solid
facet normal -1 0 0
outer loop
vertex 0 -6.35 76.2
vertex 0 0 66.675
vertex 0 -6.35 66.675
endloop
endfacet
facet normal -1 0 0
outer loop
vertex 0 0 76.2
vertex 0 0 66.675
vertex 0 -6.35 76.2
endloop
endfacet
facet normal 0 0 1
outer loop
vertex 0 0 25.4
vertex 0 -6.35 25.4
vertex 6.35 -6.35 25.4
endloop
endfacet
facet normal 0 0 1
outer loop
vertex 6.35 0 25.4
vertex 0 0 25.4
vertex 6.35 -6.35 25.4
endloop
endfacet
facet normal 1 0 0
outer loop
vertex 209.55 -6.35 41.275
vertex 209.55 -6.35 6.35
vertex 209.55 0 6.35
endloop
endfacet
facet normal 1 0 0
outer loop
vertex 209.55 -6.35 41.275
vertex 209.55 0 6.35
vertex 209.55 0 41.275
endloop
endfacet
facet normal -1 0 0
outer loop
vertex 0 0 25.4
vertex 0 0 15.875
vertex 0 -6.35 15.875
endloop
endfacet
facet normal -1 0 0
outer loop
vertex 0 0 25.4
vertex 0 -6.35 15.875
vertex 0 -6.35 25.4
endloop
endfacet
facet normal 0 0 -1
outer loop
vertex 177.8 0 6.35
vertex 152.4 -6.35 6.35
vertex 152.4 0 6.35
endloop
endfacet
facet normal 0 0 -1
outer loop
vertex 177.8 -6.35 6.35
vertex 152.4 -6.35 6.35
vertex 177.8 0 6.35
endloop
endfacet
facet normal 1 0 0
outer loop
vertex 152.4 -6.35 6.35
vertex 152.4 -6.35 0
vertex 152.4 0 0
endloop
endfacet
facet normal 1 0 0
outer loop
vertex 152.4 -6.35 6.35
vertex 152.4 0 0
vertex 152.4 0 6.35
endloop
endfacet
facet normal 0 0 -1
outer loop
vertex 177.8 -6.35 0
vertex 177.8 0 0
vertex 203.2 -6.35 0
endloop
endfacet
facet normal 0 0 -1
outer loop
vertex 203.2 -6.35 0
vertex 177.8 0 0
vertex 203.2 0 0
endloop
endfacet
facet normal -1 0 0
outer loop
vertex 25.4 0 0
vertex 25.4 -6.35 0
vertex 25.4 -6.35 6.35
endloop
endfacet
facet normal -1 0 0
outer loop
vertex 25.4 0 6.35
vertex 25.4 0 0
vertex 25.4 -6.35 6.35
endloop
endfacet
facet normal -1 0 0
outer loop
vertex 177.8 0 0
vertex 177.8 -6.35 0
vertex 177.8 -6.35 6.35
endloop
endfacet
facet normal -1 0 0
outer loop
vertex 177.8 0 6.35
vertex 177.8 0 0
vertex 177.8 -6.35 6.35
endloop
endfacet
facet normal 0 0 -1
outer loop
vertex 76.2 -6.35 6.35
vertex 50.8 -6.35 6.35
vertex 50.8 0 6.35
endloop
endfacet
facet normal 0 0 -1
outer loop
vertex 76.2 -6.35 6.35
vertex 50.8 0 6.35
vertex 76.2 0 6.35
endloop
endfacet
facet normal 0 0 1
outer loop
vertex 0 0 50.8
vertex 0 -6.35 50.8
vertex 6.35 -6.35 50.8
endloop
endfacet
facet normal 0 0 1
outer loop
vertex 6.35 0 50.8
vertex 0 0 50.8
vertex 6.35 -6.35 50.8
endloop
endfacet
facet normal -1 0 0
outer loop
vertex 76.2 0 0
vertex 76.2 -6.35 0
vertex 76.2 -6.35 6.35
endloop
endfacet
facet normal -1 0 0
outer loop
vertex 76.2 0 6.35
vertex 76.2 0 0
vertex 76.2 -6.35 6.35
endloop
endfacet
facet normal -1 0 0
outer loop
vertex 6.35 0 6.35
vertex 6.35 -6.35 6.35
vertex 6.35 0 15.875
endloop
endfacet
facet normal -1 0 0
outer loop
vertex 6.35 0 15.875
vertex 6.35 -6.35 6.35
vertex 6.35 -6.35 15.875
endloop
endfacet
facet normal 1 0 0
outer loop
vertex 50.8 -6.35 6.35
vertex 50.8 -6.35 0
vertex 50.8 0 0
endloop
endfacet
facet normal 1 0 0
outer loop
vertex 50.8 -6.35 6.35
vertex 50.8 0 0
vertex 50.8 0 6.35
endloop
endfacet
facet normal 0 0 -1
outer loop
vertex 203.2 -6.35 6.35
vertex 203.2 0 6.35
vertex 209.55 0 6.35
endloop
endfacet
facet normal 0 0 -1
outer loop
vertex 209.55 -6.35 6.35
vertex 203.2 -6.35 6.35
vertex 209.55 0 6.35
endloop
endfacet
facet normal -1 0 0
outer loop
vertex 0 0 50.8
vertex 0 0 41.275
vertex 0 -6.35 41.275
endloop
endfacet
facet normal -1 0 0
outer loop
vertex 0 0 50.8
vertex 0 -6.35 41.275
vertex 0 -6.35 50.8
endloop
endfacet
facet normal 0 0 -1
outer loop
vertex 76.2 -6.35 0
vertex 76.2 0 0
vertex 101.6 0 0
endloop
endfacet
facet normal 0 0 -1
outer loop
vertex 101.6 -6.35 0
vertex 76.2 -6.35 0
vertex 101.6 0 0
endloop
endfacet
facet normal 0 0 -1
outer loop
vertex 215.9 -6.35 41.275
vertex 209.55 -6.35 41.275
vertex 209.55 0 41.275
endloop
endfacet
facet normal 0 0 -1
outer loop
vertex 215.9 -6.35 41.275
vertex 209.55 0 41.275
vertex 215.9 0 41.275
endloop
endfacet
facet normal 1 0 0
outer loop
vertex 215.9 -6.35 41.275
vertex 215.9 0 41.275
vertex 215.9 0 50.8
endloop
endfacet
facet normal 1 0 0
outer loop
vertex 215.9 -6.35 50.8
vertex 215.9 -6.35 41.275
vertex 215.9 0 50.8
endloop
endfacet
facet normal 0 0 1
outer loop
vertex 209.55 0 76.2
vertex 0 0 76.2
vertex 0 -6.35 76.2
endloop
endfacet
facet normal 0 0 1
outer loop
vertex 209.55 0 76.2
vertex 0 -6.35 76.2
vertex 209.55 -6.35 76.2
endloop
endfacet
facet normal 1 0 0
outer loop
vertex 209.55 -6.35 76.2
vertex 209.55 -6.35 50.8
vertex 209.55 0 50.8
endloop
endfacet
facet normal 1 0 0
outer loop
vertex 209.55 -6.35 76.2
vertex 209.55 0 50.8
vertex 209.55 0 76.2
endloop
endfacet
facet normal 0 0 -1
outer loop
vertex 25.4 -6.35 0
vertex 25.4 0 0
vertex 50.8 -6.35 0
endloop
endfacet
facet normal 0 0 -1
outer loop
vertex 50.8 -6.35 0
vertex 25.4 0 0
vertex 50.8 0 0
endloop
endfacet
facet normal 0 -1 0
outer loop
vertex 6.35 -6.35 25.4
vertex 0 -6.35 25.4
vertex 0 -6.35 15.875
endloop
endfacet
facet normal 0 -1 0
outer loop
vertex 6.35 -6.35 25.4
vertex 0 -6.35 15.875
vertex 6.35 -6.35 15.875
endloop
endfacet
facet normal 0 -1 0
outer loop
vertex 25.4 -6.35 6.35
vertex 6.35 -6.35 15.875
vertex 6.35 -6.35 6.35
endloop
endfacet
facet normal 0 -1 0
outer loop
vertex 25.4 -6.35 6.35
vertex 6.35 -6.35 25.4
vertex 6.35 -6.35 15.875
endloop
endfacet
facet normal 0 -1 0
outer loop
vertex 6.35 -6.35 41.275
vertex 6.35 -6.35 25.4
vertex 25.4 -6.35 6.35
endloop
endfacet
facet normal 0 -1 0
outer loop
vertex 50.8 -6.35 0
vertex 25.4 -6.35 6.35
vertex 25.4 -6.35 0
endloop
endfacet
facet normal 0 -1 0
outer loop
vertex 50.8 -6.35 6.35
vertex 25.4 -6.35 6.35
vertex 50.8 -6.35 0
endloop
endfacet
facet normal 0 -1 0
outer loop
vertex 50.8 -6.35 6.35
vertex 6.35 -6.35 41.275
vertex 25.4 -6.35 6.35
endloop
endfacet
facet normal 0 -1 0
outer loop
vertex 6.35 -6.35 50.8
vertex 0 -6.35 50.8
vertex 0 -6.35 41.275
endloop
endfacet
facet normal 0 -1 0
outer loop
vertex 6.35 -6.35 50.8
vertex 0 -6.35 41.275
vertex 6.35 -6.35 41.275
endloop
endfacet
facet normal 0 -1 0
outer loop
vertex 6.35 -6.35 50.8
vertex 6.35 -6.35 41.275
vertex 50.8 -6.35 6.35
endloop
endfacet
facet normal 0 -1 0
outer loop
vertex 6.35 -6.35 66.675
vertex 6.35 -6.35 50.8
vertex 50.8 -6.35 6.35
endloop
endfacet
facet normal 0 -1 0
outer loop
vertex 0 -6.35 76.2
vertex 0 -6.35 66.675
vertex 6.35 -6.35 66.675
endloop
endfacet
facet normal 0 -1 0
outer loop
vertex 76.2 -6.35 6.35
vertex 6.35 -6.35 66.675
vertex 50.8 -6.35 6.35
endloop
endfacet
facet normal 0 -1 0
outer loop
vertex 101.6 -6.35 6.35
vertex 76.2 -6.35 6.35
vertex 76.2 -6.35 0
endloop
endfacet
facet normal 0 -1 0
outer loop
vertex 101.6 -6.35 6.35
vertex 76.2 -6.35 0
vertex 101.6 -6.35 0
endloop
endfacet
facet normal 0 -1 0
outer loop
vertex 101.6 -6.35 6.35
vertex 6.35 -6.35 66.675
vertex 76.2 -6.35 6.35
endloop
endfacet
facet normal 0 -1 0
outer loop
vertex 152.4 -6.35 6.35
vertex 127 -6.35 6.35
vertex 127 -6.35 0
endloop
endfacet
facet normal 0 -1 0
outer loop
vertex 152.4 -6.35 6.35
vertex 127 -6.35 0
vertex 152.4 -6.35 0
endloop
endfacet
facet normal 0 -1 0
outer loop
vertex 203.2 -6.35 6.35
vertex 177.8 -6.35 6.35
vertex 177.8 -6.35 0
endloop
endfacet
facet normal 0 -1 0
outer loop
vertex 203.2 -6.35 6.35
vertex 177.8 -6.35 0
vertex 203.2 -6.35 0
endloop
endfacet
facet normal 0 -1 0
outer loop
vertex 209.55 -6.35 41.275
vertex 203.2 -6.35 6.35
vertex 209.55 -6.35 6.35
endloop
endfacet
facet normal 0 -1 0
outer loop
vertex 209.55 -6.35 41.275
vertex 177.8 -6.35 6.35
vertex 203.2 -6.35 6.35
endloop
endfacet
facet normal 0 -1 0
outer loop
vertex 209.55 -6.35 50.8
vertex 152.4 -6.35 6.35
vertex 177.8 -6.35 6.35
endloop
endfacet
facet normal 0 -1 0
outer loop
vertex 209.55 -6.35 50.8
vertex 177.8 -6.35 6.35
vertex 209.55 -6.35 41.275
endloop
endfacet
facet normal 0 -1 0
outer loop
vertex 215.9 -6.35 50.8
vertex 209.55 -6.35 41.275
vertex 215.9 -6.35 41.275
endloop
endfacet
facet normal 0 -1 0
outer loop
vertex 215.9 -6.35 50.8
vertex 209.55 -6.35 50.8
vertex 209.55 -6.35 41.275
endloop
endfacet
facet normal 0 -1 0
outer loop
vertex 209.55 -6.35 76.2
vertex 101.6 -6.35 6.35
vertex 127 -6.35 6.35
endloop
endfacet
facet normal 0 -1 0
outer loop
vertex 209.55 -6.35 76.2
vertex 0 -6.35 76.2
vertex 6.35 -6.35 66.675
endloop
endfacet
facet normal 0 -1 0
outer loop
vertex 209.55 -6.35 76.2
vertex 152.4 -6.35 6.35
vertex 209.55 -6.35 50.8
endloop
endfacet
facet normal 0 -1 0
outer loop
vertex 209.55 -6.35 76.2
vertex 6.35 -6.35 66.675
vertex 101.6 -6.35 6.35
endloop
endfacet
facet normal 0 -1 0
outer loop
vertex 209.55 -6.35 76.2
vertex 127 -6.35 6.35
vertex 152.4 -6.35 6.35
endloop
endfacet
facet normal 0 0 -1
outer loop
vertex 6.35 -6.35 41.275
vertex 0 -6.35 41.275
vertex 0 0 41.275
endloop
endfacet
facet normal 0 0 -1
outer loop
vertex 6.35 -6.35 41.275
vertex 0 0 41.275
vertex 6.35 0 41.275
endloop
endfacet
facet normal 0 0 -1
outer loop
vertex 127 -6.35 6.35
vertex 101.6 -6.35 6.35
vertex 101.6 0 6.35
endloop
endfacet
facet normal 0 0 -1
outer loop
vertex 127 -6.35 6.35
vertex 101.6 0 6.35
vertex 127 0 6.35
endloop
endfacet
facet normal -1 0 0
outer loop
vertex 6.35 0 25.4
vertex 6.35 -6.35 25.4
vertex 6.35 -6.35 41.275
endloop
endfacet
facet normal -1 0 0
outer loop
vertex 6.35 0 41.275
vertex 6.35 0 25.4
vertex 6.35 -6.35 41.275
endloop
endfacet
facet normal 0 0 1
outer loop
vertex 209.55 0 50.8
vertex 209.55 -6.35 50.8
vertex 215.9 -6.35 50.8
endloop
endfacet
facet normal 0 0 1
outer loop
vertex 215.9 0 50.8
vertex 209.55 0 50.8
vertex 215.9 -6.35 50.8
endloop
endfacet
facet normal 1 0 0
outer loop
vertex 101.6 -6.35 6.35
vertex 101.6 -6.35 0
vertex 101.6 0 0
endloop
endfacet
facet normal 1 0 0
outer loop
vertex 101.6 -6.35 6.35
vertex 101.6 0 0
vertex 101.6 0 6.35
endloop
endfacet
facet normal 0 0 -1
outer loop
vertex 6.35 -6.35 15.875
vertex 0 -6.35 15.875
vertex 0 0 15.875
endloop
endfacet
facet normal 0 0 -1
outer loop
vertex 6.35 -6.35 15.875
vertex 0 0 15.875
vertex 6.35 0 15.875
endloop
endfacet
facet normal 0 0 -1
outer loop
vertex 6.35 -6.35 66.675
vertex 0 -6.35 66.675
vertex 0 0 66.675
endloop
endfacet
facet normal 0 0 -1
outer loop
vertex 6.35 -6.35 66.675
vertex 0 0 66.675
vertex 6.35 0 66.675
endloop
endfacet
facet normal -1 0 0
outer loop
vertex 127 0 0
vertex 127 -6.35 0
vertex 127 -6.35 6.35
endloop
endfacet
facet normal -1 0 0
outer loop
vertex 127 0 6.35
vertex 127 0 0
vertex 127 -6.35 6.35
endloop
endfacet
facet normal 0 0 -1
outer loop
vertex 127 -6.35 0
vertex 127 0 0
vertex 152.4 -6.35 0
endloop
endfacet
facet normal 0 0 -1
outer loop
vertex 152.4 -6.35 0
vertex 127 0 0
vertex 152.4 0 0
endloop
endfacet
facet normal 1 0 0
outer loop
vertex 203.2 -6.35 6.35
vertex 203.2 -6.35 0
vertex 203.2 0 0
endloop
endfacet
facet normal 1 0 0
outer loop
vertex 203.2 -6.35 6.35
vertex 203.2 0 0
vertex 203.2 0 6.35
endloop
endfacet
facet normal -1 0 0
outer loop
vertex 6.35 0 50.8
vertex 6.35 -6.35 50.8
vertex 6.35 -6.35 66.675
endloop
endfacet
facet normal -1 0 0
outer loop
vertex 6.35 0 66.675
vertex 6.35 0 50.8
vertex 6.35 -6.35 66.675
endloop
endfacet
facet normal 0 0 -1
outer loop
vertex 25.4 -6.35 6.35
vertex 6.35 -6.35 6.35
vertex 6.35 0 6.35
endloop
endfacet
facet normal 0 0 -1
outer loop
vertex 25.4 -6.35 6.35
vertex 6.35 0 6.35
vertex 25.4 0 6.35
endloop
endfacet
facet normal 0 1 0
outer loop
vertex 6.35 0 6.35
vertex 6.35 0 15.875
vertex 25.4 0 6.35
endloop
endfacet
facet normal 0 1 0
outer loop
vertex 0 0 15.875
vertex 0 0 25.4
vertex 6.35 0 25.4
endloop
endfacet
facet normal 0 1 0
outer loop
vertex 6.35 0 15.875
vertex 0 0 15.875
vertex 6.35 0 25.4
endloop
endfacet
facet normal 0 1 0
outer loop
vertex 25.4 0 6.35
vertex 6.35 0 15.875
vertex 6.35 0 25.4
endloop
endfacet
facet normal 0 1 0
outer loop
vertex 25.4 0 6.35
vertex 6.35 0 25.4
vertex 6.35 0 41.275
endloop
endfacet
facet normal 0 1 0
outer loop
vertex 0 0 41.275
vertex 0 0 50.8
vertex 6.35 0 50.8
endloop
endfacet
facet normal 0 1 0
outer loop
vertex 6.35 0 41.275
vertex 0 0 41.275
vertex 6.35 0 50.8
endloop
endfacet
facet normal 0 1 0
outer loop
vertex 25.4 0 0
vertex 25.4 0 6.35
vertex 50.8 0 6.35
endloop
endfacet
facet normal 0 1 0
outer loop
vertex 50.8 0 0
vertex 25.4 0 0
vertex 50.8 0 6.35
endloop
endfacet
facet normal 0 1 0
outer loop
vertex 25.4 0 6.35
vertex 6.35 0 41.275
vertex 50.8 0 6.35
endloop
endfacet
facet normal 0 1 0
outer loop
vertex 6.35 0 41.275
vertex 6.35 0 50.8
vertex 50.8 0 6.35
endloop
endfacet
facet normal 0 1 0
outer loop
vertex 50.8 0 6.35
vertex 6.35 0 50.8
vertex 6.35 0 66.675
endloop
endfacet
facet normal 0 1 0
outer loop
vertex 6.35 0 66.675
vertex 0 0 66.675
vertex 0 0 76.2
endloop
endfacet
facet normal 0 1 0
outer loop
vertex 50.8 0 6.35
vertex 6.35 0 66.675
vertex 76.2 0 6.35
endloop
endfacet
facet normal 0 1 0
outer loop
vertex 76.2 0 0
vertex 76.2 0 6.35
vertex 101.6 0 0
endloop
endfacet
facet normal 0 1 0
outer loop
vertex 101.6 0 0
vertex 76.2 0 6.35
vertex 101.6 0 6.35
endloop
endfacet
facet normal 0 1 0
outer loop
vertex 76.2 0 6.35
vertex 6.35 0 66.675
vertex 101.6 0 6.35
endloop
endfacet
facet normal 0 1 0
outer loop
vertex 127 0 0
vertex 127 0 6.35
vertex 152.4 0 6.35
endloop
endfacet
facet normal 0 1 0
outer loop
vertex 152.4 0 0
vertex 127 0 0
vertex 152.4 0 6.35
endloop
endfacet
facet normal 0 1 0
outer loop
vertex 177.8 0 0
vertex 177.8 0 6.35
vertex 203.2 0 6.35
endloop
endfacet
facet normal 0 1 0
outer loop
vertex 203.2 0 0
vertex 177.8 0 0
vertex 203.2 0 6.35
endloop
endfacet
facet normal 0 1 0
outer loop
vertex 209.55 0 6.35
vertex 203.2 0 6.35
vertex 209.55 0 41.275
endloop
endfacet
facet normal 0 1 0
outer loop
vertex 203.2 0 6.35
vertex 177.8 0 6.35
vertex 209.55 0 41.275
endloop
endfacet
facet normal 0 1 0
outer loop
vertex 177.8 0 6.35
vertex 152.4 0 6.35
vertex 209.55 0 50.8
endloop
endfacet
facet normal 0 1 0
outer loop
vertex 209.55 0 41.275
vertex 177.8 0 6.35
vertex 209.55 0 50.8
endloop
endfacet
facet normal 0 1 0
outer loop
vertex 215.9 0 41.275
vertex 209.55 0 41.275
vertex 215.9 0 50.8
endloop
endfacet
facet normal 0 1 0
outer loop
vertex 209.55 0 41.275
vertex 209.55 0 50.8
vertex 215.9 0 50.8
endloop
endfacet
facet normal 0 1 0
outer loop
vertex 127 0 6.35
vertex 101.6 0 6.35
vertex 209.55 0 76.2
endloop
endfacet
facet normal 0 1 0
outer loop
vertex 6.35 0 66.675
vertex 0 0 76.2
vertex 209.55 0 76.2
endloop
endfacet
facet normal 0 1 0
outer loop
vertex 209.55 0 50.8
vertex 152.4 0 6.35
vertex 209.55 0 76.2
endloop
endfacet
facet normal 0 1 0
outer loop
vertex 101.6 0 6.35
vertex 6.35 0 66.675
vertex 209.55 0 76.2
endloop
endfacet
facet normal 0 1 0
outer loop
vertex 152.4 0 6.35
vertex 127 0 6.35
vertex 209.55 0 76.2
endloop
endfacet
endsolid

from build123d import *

# Parameters (mm, degrees)
F0_W     = 215.9
F0_H     = 76.2
F1_DEPTH = 6.35
F2_W     = 6.35
F2_H     = 15.875
F2_H_2   = 9.525
F3_DEPTH = 6.35
F4_W     = 25.4
F4_H     = 6.35
F5_DEPTH = 6.351
F6_W     = 6.35
F6_H     = 9.525
F7_DEPTH = 6.35


with BuildPart() as f1:
    # F0 (on Front) → F1 (new body)
    with BuildSketch(Plane.XZ):
        with Locations((107.95, 38.1)):
            Rectangle(F0_W, F0_H)
    extrude(amount=F1_DEPTH)

    # F2 (on face) → F3 (cut, through all)
    with BuildSketch(Plane.XZ.offset(6.35)):
        with Locations((3.175, 58.7375)):
            Rectangle(F2_W, F2_H)
        with Locations((3.175, 33.3375)):
            Rectangle(F2_W, F2_H)
        with Locations((3.175, 11.1125)):
            Rectangle(F2_W, F2_H_2)
        with Locations((212.725, 11.1125)):
            Rectangle(F2_W, F2_H_2)
        with Locations((212.725, 33.3375)):
            Rectangle(F2_W, F2_H)
        with Locations((212.725, 58.7375)):
            Rectangle(F2_W, F2_H)
    extrude(amount=-F3_DEPTH, mode=Mode.SUBTRACT)

    # F4 (on face) → F5 (cut, through all)
    with BuildSketch(Plane.XZ.offset(6.35)):
        with Locations((12.7, 3.175)):
            Rectangle(F4_W, F4_H)
        with Locations((63.5, 3.175)):
            Rectangle(F4_W, F4_H)
        with Locations((114.3, 3.175)):
            Rectangle(F4_W, F4_H)
        with Locations((165.1, 3.175)):
            Rectangle(F4_W, F4_H)
        with Locations((215.9, 3.175)):
            Rectangle(F4_W, F4_H)
    extrude(amount=-F5_DEPTH, mode=Mode.SUBTRACT)

    # F6 (on face) → F7 (cut, through all)
    with BuildSketch(Plane.XZ.offset(6.35)):
        with Locations((212.725, 20.6375)):
            Rectangle(F6_W, F6_H)
        with Locations((212.725, 71.4375)):
            Rectangle(F6_W, F6_H)
    extrude(amount=-F7_DEPTH, mode=Mode.SUBTRACT)


solid = f1.part
